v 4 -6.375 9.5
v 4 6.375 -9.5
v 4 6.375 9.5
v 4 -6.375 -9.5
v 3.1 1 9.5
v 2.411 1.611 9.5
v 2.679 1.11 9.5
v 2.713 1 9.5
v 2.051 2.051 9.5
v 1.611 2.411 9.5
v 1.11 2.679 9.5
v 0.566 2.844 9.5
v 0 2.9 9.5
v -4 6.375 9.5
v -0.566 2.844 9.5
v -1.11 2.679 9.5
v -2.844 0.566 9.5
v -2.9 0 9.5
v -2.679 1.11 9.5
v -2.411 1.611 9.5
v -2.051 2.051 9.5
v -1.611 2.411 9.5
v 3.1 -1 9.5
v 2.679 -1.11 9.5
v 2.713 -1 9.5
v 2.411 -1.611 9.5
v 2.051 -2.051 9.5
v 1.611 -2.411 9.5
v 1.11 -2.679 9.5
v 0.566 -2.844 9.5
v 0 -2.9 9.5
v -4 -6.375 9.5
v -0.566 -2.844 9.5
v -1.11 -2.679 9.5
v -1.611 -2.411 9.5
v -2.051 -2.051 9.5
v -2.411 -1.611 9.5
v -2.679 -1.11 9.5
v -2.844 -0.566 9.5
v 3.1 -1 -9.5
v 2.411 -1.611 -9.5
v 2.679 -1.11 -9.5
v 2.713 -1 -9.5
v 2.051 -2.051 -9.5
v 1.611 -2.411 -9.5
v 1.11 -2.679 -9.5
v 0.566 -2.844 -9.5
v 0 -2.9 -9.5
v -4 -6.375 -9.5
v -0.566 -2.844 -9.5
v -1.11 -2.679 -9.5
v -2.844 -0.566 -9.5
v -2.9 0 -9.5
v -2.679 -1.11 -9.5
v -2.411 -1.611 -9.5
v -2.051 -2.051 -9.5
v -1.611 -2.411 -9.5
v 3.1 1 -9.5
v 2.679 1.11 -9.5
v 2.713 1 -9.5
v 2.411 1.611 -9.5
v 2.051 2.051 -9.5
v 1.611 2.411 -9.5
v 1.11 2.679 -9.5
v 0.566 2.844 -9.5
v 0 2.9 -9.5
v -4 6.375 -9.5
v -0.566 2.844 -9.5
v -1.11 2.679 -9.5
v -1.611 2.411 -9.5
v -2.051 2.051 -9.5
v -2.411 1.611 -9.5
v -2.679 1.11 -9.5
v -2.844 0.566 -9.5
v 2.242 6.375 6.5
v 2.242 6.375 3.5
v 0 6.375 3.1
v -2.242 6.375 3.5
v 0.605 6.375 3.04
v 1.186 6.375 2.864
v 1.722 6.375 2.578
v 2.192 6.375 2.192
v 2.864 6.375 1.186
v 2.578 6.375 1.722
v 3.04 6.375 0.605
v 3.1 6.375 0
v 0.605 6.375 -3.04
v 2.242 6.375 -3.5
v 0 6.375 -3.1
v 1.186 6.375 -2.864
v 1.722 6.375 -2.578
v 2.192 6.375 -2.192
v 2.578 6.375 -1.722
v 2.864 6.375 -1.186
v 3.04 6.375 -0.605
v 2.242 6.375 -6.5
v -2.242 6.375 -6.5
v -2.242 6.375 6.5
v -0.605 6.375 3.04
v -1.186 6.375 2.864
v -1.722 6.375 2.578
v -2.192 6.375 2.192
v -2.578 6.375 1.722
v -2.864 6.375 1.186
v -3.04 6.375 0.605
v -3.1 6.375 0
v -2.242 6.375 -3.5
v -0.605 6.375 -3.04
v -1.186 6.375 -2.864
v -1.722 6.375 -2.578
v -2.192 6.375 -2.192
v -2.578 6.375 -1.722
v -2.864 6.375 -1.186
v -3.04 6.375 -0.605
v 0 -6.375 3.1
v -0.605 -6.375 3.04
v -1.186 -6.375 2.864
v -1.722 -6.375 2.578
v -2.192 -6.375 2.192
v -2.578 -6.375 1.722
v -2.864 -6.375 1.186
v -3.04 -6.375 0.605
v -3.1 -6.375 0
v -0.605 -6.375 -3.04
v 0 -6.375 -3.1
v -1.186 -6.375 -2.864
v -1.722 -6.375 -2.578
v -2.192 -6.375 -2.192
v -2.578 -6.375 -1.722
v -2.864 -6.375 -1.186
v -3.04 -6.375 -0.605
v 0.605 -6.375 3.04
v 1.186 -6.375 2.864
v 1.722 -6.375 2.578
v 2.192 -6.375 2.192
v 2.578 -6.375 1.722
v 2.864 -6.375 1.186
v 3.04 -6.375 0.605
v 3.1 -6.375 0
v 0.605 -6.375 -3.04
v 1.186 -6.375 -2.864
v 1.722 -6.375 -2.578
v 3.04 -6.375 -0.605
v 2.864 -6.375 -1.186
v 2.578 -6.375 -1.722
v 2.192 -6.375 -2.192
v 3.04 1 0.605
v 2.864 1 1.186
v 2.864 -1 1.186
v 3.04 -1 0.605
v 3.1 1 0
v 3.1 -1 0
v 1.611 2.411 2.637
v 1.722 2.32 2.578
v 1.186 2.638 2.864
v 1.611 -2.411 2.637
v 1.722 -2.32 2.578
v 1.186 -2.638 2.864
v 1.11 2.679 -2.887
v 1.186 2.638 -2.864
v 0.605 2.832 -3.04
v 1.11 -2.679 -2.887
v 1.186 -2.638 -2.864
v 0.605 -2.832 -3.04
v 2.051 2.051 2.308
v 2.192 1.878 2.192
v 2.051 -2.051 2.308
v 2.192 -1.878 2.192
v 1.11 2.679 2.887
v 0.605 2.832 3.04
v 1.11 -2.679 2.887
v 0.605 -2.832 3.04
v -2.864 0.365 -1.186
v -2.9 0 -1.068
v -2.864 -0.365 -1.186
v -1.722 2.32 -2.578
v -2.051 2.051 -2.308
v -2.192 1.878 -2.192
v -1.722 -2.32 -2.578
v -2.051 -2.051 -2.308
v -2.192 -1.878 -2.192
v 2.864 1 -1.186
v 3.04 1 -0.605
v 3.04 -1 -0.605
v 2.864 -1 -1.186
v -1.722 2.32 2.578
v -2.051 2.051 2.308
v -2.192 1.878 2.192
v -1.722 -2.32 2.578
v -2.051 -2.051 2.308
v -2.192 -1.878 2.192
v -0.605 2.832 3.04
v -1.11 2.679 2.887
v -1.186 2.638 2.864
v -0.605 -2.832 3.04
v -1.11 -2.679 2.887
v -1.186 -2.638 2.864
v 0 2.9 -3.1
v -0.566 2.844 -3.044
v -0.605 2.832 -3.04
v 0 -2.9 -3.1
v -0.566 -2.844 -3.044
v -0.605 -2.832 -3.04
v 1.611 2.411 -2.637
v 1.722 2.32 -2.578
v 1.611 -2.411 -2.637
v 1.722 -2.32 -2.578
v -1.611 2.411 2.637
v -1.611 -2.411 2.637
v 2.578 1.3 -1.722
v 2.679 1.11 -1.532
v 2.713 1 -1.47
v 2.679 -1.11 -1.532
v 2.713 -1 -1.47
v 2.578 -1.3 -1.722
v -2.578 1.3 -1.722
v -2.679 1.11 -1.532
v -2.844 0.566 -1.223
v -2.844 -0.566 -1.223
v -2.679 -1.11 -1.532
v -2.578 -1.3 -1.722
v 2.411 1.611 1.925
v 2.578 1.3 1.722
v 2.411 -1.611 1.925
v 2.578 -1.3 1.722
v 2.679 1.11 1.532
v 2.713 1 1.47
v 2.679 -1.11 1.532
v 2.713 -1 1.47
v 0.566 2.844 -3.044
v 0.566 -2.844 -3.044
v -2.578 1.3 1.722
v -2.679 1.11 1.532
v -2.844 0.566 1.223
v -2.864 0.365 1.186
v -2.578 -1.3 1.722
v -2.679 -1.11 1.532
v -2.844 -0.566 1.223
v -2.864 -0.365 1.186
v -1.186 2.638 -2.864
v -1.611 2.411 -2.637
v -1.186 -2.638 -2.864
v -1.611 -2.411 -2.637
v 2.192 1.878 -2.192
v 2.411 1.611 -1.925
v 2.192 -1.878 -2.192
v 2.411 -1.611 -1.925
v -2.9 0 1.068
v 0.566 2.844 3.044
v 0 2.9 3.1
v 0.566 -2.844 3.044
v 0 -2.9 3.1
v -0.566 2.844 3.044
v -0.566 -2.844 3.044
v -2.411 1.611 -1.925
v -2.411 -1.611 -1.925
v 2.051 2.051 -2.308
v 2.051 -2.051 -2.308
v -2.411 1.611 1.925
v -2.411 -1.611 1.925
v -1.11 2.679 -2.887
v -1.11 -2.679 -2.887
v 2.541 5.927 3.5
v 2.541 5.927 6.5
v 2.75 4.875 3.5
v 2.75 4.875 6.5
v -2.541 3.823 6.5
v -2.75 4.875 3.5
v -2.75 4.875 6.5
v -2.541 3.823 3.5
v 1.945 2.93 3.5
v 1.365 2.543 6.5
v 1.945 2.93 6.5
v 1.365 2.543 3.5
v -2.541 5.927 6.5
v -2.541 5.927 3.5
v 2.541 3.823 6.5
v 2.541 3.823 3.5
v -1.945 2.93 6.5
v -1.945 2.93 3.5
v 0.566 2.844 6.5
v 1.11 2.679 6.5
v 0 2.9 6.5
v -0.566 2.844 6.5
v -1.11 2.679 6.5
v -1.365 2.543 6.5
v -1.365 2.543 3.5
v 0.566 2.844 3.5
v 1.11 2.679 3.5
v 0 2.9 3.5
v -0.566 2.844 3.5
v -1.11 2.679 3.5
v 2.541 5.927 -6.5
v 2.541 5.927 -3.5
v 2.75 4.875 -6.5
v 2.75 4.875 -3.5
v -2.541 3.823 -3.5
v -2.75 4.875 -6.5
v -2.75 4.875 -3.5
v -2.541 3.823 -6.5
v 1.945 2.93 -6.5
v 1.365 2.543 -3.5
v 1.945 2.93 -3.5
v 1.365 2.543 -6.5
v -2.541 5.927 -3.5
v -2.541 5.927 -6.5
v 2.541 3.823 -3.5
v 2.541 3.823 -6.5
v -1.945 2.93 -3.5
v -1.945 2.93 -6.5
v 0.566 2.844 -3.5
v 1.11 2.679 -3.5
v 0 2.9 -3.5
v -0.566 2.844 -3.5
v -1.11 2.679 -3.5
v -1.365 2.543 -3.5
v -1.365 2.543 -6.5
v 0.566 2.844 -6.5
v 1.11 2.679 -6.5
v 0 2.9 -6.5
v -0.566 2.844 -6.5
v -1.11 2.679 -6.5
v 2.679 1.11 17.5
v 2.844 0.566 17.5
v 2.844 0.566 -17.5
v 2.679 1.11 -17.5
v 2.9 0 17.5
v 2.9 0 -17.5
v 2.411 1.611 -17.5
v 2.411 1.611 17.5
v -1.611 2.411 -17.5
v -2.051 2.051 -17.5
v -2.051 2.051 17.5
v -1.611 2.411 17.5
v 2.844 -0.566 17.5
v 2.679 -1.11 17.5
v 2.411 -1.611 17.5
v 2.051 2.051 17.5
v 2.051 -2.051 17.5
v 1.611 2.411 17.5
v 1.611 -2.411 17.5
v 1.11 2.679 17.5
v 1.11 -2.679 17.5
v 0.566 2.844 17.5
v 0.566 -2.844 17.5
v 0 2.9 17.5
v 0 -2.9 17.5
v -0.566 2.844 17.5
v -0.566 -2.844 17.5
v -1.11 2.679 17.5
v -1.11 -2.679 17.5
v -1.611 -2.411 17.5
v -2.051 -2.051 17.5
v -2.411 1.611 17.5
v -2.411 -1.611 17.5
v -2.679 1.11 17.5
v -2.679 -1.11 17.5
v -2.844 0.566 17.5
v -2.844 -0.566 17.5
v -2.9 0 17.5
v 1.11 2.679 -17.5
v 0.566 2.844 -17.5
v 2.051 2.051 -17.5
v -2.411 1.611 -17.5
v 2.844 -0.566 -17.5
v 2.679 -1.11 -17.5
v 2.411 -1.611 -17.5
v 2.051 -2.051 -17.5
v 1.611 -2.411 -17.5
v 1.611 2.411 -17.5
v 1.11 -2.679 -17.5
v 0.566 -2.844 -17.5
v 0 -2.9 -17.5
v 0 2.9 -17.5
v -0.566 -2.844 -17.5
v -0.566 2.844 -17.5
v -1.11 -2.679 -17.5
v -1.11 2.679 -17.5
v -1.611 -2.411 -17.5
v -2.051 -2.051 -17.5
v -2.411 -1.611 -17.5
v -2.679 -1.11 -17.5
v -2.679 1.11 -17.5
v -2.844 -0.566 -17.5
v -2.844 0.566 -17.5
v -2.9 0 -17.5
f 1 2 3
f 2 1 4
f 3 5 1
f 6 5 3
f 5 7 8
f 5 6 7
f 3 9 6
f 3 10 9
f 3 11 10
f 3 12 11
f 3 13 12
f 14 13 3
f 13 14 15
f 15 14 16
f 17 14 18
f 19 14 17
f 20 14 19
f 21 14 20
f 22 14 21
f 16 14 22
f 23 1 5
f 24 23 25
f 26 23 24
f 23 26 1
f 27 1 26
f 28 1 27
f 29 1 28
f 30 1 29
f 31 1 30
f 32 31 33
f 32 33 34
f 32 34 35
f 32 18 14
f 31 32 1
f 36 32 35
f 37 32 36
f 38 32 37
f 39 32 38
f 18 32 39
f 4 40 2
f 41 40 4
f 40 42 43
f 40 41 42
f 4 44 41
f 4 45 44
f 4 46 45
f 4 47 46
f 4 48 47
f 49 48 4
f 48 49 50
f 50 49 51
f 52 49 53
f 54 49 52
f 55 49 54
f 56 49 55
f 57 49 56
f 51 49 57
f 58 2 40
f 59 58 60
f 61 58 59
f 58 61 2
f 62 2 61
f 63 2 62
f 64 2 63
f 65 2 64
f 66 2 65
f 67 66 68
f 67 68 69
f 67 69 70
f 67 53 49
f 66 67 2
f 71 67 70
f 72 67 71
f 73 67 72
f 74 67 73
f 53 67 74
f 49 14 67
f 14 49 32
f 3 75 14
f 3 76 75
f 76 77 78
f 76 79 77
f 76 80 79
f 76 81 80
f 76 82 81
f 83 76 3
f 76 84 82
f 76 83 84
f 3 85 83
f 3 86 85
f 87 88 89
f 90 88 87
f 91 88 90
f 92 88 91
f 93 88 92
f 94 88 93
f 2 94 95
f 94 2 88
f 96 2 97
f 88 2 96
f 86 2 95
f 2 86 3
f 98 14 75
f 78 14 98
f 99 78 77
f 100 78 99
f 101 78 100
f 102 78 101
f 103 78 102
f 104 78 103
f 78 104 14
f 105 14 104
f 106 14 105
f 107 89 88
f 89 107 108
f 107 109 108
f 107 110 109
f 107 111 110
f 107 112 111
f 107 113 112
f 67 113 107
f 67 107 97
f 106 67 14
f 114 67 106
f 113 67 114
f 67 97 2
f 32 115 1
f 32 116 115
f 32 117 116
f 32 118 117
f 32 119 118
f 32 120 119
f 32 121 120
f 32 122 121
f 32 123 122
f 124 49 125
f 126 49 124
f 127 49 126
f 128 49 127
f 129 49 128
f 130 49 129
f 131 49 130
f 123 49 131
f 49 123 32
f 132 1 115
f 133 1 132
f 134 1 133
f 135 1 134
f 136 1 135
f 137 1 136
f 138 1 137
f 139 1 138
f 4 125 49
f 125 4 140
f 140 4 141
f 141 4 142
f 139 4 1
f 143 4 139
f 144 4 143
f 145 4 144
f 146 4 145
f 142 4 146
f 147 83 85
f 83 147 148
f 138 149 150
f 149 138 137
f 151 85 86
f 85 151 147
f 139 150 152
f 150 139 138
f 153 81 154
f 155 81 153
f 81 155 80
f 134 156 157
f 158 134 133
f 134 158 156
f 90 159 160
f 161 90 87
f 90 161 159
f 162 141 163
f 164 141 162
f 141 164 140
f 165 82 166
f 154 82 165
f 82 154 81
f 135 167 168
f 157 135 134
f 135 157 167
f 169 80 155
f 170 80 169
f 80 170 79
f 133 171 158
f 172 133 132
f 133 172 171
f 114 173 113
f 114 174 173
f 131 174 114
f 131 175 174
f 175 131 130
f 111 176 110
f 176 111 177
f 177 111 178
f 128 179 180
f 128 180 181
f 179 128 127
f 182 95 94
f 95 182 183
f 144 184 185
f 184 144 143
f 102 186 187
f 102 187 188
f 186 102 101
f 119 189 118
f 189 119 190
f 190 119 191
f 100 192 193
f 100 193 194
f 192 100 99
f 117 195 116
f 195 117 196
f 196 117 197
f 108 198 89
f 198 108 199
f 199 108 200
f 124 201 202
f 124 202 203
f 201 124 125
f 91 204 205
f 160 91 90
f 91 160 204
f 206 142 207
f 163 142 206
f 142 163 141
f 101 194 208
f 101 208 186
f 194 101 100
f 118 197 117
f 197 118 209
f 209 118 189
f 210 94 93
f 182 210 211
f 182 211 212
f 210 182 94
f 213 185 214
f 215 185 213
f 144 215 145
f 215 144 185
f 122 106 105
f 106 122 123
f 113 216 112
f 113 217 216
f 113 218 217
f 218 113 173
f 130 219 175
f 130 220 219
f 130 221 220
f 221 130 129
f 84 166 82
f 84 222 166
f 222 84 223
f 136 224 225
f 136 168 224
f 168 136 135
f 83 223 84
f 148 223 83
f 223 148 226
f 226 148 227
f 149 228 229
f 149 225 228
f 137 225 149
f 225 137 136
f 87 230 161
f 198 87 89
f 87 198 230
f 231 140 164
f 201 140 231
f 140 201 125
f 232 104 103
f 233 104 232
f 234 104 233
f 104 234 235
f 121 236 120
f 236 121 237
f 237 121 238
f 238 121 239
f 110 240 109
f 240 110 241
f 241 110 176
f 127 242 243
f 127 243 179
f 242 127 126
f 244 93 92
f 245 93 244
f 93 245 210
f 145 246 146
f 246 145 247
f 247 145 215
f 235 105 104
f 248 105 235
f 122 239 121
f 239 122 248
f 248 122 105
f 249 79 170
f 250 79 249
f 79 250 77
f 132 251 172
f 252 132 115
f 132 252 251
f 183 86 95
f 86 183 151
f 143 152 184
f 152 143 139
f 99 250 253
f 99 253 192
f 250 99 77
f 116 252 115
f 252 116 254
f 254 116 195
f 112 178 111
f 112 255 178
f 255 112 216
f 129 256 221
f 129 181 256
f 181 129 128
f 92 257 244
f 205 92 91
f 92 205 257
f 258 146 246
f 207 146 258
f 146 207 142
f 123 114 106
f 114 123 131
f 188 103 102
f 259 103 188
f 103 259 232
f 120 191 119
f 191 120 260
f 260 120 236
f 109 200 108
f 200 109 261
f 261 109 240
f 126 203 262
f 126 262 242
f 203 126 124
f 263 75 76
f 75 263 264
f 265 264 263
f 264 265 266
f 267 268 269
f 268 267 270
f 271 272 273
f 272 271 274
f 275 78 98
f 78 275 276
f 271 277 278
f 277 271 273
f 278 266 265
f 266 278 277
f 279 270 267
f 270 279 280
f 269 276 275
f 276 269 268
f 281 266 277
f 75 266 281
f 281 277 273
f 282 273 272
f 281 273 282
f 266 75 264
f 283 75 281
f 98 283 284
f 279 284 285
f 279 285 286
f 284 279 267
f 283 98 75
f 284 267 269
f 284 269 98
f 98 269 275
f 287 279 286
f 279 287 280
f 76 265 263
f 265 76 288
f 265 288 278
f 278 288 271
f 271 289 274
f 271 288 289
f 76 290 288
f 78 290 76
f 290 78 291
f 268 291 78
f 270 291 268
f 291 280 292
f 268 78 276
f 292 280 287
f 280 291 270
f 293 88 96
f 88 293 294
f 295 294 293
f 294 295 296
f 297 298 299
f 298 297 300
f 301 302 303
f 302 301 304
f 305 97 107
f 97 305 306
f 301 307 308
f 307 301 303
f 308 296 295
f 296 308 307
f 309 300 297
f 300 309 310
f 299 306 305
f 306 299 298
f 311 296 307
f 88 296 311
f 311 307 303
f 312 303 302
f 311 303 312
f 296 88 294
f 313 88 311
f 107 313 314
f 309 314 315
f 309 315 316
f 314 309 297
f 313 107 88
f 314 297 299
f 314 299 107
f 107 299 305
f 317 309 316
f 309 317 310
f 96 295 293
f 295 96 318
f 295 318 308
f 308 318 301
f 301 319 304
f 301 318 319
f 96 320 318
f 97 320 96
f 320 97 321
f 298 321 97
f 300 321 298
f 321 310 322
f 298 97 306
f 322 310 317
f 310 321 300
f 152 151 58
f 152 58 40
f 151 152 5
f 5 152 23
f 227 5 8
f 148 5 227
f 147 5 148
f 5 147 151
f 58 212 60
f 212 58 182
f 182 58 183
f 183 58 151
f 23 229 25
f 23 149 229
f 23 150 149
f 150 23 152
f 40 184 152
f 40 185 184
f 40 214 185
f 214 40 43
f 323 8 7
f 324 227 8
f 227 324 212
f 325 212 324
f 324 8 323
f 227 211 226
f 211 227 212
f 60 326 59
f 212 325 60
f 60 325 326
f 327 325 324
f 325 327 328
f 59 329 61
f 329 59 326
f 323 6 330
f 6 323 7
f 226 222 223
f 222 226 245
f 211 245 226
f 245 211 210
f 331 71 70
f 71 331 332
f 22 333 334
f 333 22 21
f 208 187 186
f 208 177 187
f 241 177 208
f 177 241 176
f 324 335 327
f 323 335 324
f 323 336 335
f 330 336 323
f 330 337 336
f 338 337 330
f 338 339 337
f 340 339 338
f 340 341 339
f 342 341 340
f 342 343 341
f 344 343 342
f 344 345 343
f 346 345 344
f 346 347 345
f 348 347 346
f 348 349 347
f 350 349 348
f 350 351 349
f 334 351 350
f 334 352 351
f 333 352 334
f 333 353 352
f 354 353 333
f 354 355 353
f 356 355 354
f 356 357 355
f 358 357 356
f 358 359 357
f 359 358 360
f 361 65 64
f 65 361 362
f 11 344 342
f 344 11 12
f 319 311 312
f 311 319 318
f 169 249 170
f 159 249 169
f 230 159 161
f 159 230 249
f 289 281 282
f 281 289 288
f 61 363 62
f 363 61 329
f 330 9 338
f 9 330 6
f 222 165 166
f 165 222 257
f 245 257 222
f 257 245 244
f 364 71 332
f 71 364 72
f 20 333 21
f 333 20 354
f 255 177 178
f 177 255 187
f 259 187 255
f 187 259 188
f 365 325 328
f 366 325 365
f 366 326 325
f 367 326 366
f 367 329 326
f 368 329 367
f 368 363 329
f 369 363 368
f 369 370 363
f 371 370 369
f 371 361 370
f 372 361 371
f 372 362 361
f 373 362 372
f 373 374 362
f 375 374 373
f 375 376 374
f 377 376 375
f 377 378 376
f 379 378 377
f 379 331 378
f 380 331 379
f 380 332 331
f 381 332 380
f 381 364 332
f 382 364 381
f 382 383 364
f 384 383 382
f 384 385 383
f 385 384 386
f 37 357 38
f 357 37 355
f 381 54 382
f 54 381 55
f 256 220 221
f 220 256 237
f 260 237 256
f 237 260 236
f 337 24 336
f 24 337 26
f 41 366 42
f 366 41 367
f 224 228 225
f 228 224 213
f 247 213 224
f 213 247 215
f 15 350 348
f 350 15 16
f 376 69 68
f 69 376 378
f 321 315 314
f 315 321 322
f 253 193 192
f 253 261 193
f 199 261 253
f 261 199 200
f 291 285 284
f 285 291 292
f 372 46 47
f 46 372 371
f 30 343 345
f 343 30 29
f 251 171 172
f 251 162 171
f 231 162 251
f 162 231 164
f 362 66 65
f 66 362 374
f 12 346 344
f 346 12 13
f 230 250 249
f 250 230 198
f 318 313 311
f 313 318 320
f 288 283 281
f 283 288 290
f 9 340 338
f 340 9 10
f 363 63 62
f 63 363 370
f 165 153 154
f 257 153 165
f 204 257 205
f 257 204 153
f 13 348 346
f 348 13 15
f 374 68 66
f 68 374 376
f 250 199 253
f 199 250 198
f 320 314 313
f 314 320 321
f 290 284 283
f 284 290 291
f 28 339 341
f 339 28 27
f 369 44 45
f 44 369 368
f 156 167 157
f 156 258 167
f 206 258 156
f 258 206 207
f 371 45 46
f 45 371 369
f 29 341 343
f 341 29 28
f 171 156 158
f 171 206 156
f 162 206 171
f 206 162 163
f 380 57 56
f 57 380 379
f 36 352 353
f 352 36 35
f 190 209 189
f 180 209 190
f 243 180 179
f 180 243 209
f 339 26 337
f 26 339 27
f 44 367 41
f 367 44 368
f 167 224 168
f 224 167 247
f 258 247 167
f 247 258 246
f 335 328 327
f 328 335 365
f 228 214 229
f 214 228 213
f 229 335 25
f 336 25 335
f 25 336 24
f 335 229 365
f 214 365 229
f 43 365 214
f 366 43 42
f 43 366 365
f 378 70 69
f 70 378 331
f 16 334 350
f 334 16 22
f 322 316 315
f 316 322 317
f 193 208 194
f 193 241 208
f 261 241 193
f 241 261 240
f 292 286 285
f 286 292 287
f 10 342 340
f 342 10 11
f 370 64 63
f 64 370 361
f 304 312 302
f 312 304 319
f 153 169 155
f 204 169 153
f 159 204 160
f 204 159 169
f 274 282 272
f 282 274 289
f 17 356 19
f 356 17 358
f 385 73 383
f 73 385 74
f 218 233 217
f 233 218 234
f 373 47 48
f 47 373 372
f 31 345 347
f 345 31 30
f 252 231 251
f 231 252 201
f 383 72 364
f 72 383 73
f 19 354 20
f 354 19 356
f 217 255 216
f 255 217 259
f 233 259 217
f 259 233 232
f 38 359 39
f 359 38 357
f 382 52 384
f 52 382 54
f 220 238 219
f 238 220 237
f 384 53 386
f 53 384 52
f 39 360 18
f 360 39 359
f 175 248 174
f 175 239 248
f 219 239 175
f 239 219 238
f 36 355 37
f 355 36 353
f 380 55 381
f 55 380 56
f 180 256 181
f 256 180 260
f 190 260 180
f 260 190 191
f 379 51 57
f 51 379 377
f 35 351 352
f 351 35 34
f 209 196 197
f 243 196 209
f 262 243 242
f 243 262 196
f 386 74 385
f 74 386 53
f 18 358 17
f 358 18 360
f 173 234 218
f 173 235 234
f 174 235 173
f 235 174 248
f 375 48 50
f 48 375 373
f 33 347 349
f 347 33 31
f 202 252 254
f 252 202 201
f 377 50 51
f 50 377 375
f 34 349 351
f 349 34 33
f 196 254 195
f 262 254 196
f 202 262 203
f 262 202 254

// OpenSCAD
// Parameters
block_width = 8.0; //[4.0:16.0:0.25]
block_height = 12.75; //[6.0:25.5:0.25]
block_length = 19.0; //[10.0:38.0:0.25]
tolerance_clearance = 0.2; //[0.0:0.6:0.05]
bore_diameter = 6.0; //[2.0:10.0:0.1]
nut_capture_depth = 0.0; //[0.0:10.0:0.25]
mount_hole_count = 2; //[0:4:1]
mount_hole_diameter = 3.0; //[1.5:5.0:0.1]
mount_hole_spacing = 10.0; //[6.0:16.0:0.25]
counterbore_diameter = 5.5; //[3.5:9.0:0.1]
counterbore_depth = 2.0; //[0.5:6.0:0.1]
anti_rotation_flat_depth = 0.8; //[0.0:2.0:0.05]
anti_rotation_flat_width = 2.0; //[0.5:5.0:0.1]
edge_chamfer = 0.0; //[0.0:1.5:0.1]
edge_fillet_radius = 0.0; //[0.0:2.0:0.1]
leadscrew_diameter = 5.8; //[2.0:9.5:0.1]
leadscrew_length = 35.0; //[19.0:80.0:0.5]
overlap = 1.0; //[0.5:2.0:0.1]

// Leadscrew - detailed geometry
module leadscrew() {
  color("Silver") {
    cylinder(d=leadscrew_diameter, h=leadscrew_length, center=true, $fn=32);
  }
}

// Main block with features
module housing_block() {
  color([0.85, 0.85, 0.8]) {
    difference() {
      // Main body
      cube([block_width, block_height, block_length], center=true);
      
      // Central bore
      translate([0, 0, 0])
        rotate([90, 0, 0])
        cylinder(d=bore_diameter + tolerance_clearance, h=block_length + 2*overlap, center=true, $fn=32);
      
      // Mounting holes
      if (mount_hole_count > 0) {
        translate([0, 0, mount_hole_spacing/2])
          cylinder(d=mount_hole_diameter + tolerance_clearance, h=block_height + 2*overlap, center=true, $fn=16);
        translate([0, 0, -mount_hole_spacing/2])
          cylinder(d=mount_hole_diameter + tolerance_clearance, h=block_height + 2*overlap, center=true, $fn=16);
      }
      
      // Counterbores
      translate([0, block_height/2 - (counterbore_depth + overlap)/2, mount_hole_spacing/2])
        cylinder(d=counterbore_diameter, h=counterbore_depth + overlap, center=true, $fn=16);
      translate([0, block_height/2 - (counterbore_depth + overlap)/2, -mount_hole_spacing/2])
        cylinder(d=counterbore_diameter, h=counterbore_depth + overlap, center=true, $fn=16);
      
      // Anti-rotation feature
      translate([(bore_diameter + tolerance_clearance)/2 - (anti_rotation_flat_depth + overlap)/2, 0, 0])
        cube([anti_rotation_flat_depth + overlap, anti_rotation_flat_width, block_length + 2*overlap], center=true);
    }
  }
}

// Assembly
module assembly() {
  housing_block();
  translate([0, 0, 0]) leadscrew();
}

assembly();
